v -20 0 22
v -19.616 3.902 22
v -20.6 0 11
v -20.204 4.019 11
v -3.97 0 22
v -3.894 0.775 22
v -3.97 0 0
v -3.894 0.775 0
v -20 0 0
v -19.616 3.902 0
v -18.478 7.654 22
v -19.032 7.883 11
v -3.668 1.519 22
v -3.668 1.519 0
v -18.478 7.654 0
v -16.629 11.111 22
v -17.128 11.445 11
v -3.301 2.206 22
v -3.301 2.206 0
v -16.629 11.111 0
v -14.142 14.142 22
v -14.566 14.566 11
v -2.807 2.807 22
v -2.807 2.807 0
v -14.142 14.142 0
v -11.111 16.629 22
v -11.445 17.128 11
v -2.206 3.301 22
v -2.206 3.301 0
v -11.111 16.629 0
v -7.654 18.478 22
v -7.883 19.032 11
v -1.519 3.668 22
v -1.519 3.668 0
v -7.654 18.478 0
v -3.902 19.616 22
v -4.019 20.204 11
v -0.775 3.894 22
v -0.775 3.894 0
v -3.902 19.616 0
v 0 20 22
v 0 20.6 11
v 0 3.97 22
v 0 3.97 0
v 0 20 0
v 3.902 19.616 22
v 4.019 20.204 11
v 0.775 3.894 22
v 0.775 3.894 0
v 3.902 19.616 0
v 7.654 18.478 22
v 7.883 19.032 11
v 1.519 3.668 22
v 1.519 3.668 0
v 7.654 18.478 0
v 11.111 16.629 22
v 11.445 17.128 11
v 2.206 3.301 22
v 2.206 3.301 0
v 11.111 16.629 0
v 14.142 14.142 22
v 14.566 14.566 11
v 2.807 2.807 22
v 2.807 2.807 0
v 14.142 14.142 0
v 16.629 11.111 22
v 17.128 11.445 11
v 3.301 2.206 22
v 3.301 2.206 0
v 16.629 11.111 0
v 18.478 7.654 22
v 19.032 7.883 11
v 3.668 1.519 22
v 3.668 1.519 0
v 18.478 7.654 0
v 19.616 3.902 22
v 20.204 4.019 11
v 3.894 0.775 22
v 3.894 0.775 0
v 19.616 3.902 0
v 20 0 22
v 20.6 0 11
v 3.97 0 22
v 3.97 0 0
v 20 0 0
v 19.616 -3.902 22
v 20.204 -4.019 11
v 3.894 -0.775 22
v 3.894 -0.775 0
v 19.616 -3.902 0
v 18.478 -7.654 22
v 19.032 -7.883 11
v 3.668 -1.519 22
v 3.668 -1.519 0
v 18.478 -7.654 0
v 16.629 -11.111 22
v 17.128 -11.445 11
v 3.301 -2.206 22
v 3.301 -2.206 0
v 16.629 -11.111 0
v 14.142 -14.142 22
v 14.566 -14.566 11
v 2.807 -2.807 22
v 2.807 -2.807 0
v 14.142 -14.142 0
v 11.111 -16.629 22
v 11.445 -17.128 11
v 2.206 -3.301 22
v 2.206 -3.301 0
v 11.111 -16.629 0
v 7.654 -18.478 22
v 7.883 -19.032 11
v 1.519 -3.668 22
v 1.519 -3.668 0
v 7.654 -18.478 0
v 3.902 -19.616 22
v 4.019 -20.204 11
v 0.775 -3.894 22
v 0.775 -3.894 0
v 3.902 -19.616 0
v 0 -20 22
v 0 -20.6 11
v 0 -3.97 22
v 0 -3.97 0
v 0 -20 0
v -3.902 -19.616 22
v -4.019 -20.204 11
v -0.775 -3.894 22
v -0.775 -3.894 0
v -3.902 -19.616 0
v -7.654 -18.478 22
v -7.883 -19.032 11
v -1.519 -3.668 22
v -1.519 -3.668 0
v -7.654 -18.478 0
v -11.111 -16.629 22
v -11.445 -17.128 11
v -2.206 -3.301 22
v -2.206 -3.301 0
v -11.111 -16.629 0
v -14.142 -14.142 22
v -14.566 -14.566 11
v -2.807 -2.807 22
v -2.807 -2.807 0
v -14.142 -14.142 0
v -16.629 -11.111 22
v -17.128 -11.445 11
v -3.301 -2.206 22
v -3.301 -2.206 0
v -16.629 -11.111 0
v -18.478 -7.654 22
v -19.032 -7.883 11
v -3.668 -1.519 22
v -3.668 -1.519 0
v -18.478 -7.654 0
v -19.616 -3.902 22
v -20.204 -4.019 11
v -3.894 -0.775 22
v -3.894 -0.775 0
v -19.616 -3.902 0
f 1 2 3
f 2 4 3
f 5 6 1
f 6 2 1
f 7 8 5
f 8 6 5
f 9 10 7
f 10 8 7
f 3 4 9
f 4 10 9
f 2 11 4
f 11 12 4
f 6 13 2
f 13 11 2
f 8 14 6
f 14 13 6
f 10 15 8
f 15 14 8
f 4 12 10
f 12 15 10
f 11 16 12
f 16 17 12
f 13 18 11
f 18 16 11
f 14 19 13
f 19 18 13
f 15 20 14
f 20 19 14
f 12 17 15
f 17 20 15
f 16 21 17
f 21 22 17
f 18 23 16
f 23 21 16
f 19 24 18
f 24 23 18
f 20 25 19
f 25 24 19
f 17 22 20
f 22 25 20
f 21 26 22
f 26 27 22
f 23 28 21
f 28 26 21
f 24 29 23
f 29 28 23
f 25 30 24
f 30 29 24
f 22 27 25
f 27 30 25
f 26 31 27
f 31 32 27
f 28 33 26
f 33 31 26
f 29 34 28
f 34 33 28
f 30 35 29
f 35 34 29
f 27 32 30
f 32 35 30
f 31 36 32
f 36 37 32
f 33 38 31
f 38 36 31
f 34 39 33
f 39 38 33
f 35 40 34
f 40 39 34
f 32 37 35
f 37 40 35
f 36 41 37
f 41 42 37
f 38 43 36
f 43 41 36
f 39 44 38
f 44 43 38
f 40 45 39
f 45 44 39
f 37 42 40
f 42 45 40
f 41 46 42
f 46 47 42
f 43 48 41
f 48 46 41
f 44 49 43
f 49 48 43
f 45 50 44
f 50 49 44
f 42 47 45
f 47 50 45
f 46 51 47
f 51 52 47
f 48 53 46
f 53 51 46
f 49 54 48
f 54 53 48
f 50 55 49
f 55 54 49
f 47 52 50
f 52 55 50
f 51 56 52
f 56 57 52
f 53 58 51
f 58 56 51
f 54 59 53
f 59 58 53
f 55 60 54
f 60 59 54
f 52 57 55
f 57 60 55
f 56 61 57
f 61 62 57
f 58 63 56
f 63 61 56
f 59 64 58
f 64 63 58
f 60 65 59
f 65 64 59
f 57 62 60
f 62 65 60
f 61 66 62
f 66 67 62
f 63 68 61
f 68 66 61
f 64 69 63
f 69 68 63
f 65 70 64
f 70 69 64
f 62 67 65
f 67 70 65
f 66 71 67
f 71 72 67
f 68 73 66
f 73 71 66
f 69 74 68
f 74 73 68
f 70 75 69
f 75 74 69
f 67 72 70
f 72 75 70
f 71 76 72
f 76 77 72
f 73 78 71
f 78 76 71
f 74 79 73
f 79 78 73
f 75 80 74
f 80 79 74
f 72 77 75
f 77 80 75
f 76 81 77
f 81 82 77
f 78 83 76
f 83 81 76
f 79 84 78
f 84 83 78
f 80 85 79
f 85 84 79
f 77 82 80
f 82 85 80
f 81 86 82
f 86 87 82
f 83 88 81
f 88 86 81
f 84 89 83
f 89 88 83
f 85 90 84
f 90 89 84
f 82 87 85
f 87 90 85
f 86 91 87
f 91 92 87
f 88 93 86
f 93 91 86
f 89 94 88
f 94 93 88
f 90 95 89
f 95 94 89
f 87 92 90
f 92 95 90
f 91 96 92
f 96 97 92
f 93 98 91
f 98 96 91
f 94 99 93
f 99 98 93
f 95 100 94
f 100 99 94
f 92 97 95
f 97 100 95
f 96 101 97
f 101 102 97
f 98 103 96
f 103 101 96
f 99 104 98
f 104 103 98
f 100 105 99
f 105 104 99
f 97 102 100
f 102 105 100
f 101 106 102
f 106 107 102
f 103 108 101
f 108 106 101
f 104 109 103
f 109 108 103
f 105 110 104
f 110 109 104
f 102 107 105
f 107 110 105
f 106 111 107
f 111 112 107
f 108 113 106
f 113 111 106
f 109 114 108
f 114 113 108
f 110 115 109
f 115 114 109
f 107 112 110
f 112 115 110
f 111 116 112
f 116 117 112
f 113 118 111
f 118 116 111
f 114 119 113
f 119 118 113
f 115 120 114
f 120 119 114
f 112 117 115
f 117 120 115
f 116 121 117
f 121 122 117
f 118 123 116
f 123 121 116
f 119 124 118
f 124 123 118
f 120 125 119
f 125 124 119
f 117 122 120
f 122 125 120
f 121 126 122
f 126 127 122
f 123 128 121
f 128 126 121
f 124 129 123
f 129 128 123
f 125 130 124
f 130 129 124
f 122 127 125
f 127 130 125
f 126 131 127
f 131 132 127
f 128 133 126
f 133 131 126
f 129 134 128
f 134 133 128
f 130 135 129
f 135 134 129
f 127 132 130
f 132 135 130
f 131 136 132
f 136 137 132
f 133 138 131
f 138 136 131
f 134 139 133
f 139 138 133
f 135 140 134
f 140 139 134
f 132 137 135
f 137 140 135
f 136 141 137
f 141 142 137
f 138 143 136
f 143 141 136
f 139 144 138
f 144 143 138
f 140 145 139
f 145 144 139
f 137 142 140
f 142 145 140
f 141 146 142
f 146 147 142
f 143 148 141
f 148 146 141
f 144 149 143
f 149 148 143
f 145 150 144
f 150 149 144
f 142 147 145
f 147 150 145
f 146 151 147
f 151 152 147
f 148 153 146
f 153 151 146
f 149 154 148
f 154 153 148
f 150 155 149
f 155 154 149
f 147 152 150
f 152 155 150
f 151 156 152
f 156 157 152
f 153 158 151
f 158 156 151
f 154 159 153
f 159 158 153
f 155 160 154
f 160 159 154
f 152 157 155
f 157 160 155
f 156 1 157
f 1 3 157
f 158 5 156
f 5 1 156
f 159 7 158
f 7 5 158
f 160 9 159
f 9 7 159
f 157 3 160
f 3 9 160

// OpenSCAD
$fn = 32;

// ----------------------------------------------------------------------
// Belt roller: 40 mm barrel, 22 mm wide, bore 7.94 mm
// ----------------------------------------------------------------------

// --- parameters (mm) ---
bore_d = 7.94;            // bore
barrel_d = 40;            // barrel diameter
roller_w = 22;            // roller width
crown = 0.6;              // crown height at mid width

roller_profile = [[3.97, 0], [20, 0], [20.6, 11], [20, 22], [3.97, 22]];

/* the profile stays clear of the axis, so the bore comes out of the revolve */
rotate_extrude() polygon(roller_profile);
